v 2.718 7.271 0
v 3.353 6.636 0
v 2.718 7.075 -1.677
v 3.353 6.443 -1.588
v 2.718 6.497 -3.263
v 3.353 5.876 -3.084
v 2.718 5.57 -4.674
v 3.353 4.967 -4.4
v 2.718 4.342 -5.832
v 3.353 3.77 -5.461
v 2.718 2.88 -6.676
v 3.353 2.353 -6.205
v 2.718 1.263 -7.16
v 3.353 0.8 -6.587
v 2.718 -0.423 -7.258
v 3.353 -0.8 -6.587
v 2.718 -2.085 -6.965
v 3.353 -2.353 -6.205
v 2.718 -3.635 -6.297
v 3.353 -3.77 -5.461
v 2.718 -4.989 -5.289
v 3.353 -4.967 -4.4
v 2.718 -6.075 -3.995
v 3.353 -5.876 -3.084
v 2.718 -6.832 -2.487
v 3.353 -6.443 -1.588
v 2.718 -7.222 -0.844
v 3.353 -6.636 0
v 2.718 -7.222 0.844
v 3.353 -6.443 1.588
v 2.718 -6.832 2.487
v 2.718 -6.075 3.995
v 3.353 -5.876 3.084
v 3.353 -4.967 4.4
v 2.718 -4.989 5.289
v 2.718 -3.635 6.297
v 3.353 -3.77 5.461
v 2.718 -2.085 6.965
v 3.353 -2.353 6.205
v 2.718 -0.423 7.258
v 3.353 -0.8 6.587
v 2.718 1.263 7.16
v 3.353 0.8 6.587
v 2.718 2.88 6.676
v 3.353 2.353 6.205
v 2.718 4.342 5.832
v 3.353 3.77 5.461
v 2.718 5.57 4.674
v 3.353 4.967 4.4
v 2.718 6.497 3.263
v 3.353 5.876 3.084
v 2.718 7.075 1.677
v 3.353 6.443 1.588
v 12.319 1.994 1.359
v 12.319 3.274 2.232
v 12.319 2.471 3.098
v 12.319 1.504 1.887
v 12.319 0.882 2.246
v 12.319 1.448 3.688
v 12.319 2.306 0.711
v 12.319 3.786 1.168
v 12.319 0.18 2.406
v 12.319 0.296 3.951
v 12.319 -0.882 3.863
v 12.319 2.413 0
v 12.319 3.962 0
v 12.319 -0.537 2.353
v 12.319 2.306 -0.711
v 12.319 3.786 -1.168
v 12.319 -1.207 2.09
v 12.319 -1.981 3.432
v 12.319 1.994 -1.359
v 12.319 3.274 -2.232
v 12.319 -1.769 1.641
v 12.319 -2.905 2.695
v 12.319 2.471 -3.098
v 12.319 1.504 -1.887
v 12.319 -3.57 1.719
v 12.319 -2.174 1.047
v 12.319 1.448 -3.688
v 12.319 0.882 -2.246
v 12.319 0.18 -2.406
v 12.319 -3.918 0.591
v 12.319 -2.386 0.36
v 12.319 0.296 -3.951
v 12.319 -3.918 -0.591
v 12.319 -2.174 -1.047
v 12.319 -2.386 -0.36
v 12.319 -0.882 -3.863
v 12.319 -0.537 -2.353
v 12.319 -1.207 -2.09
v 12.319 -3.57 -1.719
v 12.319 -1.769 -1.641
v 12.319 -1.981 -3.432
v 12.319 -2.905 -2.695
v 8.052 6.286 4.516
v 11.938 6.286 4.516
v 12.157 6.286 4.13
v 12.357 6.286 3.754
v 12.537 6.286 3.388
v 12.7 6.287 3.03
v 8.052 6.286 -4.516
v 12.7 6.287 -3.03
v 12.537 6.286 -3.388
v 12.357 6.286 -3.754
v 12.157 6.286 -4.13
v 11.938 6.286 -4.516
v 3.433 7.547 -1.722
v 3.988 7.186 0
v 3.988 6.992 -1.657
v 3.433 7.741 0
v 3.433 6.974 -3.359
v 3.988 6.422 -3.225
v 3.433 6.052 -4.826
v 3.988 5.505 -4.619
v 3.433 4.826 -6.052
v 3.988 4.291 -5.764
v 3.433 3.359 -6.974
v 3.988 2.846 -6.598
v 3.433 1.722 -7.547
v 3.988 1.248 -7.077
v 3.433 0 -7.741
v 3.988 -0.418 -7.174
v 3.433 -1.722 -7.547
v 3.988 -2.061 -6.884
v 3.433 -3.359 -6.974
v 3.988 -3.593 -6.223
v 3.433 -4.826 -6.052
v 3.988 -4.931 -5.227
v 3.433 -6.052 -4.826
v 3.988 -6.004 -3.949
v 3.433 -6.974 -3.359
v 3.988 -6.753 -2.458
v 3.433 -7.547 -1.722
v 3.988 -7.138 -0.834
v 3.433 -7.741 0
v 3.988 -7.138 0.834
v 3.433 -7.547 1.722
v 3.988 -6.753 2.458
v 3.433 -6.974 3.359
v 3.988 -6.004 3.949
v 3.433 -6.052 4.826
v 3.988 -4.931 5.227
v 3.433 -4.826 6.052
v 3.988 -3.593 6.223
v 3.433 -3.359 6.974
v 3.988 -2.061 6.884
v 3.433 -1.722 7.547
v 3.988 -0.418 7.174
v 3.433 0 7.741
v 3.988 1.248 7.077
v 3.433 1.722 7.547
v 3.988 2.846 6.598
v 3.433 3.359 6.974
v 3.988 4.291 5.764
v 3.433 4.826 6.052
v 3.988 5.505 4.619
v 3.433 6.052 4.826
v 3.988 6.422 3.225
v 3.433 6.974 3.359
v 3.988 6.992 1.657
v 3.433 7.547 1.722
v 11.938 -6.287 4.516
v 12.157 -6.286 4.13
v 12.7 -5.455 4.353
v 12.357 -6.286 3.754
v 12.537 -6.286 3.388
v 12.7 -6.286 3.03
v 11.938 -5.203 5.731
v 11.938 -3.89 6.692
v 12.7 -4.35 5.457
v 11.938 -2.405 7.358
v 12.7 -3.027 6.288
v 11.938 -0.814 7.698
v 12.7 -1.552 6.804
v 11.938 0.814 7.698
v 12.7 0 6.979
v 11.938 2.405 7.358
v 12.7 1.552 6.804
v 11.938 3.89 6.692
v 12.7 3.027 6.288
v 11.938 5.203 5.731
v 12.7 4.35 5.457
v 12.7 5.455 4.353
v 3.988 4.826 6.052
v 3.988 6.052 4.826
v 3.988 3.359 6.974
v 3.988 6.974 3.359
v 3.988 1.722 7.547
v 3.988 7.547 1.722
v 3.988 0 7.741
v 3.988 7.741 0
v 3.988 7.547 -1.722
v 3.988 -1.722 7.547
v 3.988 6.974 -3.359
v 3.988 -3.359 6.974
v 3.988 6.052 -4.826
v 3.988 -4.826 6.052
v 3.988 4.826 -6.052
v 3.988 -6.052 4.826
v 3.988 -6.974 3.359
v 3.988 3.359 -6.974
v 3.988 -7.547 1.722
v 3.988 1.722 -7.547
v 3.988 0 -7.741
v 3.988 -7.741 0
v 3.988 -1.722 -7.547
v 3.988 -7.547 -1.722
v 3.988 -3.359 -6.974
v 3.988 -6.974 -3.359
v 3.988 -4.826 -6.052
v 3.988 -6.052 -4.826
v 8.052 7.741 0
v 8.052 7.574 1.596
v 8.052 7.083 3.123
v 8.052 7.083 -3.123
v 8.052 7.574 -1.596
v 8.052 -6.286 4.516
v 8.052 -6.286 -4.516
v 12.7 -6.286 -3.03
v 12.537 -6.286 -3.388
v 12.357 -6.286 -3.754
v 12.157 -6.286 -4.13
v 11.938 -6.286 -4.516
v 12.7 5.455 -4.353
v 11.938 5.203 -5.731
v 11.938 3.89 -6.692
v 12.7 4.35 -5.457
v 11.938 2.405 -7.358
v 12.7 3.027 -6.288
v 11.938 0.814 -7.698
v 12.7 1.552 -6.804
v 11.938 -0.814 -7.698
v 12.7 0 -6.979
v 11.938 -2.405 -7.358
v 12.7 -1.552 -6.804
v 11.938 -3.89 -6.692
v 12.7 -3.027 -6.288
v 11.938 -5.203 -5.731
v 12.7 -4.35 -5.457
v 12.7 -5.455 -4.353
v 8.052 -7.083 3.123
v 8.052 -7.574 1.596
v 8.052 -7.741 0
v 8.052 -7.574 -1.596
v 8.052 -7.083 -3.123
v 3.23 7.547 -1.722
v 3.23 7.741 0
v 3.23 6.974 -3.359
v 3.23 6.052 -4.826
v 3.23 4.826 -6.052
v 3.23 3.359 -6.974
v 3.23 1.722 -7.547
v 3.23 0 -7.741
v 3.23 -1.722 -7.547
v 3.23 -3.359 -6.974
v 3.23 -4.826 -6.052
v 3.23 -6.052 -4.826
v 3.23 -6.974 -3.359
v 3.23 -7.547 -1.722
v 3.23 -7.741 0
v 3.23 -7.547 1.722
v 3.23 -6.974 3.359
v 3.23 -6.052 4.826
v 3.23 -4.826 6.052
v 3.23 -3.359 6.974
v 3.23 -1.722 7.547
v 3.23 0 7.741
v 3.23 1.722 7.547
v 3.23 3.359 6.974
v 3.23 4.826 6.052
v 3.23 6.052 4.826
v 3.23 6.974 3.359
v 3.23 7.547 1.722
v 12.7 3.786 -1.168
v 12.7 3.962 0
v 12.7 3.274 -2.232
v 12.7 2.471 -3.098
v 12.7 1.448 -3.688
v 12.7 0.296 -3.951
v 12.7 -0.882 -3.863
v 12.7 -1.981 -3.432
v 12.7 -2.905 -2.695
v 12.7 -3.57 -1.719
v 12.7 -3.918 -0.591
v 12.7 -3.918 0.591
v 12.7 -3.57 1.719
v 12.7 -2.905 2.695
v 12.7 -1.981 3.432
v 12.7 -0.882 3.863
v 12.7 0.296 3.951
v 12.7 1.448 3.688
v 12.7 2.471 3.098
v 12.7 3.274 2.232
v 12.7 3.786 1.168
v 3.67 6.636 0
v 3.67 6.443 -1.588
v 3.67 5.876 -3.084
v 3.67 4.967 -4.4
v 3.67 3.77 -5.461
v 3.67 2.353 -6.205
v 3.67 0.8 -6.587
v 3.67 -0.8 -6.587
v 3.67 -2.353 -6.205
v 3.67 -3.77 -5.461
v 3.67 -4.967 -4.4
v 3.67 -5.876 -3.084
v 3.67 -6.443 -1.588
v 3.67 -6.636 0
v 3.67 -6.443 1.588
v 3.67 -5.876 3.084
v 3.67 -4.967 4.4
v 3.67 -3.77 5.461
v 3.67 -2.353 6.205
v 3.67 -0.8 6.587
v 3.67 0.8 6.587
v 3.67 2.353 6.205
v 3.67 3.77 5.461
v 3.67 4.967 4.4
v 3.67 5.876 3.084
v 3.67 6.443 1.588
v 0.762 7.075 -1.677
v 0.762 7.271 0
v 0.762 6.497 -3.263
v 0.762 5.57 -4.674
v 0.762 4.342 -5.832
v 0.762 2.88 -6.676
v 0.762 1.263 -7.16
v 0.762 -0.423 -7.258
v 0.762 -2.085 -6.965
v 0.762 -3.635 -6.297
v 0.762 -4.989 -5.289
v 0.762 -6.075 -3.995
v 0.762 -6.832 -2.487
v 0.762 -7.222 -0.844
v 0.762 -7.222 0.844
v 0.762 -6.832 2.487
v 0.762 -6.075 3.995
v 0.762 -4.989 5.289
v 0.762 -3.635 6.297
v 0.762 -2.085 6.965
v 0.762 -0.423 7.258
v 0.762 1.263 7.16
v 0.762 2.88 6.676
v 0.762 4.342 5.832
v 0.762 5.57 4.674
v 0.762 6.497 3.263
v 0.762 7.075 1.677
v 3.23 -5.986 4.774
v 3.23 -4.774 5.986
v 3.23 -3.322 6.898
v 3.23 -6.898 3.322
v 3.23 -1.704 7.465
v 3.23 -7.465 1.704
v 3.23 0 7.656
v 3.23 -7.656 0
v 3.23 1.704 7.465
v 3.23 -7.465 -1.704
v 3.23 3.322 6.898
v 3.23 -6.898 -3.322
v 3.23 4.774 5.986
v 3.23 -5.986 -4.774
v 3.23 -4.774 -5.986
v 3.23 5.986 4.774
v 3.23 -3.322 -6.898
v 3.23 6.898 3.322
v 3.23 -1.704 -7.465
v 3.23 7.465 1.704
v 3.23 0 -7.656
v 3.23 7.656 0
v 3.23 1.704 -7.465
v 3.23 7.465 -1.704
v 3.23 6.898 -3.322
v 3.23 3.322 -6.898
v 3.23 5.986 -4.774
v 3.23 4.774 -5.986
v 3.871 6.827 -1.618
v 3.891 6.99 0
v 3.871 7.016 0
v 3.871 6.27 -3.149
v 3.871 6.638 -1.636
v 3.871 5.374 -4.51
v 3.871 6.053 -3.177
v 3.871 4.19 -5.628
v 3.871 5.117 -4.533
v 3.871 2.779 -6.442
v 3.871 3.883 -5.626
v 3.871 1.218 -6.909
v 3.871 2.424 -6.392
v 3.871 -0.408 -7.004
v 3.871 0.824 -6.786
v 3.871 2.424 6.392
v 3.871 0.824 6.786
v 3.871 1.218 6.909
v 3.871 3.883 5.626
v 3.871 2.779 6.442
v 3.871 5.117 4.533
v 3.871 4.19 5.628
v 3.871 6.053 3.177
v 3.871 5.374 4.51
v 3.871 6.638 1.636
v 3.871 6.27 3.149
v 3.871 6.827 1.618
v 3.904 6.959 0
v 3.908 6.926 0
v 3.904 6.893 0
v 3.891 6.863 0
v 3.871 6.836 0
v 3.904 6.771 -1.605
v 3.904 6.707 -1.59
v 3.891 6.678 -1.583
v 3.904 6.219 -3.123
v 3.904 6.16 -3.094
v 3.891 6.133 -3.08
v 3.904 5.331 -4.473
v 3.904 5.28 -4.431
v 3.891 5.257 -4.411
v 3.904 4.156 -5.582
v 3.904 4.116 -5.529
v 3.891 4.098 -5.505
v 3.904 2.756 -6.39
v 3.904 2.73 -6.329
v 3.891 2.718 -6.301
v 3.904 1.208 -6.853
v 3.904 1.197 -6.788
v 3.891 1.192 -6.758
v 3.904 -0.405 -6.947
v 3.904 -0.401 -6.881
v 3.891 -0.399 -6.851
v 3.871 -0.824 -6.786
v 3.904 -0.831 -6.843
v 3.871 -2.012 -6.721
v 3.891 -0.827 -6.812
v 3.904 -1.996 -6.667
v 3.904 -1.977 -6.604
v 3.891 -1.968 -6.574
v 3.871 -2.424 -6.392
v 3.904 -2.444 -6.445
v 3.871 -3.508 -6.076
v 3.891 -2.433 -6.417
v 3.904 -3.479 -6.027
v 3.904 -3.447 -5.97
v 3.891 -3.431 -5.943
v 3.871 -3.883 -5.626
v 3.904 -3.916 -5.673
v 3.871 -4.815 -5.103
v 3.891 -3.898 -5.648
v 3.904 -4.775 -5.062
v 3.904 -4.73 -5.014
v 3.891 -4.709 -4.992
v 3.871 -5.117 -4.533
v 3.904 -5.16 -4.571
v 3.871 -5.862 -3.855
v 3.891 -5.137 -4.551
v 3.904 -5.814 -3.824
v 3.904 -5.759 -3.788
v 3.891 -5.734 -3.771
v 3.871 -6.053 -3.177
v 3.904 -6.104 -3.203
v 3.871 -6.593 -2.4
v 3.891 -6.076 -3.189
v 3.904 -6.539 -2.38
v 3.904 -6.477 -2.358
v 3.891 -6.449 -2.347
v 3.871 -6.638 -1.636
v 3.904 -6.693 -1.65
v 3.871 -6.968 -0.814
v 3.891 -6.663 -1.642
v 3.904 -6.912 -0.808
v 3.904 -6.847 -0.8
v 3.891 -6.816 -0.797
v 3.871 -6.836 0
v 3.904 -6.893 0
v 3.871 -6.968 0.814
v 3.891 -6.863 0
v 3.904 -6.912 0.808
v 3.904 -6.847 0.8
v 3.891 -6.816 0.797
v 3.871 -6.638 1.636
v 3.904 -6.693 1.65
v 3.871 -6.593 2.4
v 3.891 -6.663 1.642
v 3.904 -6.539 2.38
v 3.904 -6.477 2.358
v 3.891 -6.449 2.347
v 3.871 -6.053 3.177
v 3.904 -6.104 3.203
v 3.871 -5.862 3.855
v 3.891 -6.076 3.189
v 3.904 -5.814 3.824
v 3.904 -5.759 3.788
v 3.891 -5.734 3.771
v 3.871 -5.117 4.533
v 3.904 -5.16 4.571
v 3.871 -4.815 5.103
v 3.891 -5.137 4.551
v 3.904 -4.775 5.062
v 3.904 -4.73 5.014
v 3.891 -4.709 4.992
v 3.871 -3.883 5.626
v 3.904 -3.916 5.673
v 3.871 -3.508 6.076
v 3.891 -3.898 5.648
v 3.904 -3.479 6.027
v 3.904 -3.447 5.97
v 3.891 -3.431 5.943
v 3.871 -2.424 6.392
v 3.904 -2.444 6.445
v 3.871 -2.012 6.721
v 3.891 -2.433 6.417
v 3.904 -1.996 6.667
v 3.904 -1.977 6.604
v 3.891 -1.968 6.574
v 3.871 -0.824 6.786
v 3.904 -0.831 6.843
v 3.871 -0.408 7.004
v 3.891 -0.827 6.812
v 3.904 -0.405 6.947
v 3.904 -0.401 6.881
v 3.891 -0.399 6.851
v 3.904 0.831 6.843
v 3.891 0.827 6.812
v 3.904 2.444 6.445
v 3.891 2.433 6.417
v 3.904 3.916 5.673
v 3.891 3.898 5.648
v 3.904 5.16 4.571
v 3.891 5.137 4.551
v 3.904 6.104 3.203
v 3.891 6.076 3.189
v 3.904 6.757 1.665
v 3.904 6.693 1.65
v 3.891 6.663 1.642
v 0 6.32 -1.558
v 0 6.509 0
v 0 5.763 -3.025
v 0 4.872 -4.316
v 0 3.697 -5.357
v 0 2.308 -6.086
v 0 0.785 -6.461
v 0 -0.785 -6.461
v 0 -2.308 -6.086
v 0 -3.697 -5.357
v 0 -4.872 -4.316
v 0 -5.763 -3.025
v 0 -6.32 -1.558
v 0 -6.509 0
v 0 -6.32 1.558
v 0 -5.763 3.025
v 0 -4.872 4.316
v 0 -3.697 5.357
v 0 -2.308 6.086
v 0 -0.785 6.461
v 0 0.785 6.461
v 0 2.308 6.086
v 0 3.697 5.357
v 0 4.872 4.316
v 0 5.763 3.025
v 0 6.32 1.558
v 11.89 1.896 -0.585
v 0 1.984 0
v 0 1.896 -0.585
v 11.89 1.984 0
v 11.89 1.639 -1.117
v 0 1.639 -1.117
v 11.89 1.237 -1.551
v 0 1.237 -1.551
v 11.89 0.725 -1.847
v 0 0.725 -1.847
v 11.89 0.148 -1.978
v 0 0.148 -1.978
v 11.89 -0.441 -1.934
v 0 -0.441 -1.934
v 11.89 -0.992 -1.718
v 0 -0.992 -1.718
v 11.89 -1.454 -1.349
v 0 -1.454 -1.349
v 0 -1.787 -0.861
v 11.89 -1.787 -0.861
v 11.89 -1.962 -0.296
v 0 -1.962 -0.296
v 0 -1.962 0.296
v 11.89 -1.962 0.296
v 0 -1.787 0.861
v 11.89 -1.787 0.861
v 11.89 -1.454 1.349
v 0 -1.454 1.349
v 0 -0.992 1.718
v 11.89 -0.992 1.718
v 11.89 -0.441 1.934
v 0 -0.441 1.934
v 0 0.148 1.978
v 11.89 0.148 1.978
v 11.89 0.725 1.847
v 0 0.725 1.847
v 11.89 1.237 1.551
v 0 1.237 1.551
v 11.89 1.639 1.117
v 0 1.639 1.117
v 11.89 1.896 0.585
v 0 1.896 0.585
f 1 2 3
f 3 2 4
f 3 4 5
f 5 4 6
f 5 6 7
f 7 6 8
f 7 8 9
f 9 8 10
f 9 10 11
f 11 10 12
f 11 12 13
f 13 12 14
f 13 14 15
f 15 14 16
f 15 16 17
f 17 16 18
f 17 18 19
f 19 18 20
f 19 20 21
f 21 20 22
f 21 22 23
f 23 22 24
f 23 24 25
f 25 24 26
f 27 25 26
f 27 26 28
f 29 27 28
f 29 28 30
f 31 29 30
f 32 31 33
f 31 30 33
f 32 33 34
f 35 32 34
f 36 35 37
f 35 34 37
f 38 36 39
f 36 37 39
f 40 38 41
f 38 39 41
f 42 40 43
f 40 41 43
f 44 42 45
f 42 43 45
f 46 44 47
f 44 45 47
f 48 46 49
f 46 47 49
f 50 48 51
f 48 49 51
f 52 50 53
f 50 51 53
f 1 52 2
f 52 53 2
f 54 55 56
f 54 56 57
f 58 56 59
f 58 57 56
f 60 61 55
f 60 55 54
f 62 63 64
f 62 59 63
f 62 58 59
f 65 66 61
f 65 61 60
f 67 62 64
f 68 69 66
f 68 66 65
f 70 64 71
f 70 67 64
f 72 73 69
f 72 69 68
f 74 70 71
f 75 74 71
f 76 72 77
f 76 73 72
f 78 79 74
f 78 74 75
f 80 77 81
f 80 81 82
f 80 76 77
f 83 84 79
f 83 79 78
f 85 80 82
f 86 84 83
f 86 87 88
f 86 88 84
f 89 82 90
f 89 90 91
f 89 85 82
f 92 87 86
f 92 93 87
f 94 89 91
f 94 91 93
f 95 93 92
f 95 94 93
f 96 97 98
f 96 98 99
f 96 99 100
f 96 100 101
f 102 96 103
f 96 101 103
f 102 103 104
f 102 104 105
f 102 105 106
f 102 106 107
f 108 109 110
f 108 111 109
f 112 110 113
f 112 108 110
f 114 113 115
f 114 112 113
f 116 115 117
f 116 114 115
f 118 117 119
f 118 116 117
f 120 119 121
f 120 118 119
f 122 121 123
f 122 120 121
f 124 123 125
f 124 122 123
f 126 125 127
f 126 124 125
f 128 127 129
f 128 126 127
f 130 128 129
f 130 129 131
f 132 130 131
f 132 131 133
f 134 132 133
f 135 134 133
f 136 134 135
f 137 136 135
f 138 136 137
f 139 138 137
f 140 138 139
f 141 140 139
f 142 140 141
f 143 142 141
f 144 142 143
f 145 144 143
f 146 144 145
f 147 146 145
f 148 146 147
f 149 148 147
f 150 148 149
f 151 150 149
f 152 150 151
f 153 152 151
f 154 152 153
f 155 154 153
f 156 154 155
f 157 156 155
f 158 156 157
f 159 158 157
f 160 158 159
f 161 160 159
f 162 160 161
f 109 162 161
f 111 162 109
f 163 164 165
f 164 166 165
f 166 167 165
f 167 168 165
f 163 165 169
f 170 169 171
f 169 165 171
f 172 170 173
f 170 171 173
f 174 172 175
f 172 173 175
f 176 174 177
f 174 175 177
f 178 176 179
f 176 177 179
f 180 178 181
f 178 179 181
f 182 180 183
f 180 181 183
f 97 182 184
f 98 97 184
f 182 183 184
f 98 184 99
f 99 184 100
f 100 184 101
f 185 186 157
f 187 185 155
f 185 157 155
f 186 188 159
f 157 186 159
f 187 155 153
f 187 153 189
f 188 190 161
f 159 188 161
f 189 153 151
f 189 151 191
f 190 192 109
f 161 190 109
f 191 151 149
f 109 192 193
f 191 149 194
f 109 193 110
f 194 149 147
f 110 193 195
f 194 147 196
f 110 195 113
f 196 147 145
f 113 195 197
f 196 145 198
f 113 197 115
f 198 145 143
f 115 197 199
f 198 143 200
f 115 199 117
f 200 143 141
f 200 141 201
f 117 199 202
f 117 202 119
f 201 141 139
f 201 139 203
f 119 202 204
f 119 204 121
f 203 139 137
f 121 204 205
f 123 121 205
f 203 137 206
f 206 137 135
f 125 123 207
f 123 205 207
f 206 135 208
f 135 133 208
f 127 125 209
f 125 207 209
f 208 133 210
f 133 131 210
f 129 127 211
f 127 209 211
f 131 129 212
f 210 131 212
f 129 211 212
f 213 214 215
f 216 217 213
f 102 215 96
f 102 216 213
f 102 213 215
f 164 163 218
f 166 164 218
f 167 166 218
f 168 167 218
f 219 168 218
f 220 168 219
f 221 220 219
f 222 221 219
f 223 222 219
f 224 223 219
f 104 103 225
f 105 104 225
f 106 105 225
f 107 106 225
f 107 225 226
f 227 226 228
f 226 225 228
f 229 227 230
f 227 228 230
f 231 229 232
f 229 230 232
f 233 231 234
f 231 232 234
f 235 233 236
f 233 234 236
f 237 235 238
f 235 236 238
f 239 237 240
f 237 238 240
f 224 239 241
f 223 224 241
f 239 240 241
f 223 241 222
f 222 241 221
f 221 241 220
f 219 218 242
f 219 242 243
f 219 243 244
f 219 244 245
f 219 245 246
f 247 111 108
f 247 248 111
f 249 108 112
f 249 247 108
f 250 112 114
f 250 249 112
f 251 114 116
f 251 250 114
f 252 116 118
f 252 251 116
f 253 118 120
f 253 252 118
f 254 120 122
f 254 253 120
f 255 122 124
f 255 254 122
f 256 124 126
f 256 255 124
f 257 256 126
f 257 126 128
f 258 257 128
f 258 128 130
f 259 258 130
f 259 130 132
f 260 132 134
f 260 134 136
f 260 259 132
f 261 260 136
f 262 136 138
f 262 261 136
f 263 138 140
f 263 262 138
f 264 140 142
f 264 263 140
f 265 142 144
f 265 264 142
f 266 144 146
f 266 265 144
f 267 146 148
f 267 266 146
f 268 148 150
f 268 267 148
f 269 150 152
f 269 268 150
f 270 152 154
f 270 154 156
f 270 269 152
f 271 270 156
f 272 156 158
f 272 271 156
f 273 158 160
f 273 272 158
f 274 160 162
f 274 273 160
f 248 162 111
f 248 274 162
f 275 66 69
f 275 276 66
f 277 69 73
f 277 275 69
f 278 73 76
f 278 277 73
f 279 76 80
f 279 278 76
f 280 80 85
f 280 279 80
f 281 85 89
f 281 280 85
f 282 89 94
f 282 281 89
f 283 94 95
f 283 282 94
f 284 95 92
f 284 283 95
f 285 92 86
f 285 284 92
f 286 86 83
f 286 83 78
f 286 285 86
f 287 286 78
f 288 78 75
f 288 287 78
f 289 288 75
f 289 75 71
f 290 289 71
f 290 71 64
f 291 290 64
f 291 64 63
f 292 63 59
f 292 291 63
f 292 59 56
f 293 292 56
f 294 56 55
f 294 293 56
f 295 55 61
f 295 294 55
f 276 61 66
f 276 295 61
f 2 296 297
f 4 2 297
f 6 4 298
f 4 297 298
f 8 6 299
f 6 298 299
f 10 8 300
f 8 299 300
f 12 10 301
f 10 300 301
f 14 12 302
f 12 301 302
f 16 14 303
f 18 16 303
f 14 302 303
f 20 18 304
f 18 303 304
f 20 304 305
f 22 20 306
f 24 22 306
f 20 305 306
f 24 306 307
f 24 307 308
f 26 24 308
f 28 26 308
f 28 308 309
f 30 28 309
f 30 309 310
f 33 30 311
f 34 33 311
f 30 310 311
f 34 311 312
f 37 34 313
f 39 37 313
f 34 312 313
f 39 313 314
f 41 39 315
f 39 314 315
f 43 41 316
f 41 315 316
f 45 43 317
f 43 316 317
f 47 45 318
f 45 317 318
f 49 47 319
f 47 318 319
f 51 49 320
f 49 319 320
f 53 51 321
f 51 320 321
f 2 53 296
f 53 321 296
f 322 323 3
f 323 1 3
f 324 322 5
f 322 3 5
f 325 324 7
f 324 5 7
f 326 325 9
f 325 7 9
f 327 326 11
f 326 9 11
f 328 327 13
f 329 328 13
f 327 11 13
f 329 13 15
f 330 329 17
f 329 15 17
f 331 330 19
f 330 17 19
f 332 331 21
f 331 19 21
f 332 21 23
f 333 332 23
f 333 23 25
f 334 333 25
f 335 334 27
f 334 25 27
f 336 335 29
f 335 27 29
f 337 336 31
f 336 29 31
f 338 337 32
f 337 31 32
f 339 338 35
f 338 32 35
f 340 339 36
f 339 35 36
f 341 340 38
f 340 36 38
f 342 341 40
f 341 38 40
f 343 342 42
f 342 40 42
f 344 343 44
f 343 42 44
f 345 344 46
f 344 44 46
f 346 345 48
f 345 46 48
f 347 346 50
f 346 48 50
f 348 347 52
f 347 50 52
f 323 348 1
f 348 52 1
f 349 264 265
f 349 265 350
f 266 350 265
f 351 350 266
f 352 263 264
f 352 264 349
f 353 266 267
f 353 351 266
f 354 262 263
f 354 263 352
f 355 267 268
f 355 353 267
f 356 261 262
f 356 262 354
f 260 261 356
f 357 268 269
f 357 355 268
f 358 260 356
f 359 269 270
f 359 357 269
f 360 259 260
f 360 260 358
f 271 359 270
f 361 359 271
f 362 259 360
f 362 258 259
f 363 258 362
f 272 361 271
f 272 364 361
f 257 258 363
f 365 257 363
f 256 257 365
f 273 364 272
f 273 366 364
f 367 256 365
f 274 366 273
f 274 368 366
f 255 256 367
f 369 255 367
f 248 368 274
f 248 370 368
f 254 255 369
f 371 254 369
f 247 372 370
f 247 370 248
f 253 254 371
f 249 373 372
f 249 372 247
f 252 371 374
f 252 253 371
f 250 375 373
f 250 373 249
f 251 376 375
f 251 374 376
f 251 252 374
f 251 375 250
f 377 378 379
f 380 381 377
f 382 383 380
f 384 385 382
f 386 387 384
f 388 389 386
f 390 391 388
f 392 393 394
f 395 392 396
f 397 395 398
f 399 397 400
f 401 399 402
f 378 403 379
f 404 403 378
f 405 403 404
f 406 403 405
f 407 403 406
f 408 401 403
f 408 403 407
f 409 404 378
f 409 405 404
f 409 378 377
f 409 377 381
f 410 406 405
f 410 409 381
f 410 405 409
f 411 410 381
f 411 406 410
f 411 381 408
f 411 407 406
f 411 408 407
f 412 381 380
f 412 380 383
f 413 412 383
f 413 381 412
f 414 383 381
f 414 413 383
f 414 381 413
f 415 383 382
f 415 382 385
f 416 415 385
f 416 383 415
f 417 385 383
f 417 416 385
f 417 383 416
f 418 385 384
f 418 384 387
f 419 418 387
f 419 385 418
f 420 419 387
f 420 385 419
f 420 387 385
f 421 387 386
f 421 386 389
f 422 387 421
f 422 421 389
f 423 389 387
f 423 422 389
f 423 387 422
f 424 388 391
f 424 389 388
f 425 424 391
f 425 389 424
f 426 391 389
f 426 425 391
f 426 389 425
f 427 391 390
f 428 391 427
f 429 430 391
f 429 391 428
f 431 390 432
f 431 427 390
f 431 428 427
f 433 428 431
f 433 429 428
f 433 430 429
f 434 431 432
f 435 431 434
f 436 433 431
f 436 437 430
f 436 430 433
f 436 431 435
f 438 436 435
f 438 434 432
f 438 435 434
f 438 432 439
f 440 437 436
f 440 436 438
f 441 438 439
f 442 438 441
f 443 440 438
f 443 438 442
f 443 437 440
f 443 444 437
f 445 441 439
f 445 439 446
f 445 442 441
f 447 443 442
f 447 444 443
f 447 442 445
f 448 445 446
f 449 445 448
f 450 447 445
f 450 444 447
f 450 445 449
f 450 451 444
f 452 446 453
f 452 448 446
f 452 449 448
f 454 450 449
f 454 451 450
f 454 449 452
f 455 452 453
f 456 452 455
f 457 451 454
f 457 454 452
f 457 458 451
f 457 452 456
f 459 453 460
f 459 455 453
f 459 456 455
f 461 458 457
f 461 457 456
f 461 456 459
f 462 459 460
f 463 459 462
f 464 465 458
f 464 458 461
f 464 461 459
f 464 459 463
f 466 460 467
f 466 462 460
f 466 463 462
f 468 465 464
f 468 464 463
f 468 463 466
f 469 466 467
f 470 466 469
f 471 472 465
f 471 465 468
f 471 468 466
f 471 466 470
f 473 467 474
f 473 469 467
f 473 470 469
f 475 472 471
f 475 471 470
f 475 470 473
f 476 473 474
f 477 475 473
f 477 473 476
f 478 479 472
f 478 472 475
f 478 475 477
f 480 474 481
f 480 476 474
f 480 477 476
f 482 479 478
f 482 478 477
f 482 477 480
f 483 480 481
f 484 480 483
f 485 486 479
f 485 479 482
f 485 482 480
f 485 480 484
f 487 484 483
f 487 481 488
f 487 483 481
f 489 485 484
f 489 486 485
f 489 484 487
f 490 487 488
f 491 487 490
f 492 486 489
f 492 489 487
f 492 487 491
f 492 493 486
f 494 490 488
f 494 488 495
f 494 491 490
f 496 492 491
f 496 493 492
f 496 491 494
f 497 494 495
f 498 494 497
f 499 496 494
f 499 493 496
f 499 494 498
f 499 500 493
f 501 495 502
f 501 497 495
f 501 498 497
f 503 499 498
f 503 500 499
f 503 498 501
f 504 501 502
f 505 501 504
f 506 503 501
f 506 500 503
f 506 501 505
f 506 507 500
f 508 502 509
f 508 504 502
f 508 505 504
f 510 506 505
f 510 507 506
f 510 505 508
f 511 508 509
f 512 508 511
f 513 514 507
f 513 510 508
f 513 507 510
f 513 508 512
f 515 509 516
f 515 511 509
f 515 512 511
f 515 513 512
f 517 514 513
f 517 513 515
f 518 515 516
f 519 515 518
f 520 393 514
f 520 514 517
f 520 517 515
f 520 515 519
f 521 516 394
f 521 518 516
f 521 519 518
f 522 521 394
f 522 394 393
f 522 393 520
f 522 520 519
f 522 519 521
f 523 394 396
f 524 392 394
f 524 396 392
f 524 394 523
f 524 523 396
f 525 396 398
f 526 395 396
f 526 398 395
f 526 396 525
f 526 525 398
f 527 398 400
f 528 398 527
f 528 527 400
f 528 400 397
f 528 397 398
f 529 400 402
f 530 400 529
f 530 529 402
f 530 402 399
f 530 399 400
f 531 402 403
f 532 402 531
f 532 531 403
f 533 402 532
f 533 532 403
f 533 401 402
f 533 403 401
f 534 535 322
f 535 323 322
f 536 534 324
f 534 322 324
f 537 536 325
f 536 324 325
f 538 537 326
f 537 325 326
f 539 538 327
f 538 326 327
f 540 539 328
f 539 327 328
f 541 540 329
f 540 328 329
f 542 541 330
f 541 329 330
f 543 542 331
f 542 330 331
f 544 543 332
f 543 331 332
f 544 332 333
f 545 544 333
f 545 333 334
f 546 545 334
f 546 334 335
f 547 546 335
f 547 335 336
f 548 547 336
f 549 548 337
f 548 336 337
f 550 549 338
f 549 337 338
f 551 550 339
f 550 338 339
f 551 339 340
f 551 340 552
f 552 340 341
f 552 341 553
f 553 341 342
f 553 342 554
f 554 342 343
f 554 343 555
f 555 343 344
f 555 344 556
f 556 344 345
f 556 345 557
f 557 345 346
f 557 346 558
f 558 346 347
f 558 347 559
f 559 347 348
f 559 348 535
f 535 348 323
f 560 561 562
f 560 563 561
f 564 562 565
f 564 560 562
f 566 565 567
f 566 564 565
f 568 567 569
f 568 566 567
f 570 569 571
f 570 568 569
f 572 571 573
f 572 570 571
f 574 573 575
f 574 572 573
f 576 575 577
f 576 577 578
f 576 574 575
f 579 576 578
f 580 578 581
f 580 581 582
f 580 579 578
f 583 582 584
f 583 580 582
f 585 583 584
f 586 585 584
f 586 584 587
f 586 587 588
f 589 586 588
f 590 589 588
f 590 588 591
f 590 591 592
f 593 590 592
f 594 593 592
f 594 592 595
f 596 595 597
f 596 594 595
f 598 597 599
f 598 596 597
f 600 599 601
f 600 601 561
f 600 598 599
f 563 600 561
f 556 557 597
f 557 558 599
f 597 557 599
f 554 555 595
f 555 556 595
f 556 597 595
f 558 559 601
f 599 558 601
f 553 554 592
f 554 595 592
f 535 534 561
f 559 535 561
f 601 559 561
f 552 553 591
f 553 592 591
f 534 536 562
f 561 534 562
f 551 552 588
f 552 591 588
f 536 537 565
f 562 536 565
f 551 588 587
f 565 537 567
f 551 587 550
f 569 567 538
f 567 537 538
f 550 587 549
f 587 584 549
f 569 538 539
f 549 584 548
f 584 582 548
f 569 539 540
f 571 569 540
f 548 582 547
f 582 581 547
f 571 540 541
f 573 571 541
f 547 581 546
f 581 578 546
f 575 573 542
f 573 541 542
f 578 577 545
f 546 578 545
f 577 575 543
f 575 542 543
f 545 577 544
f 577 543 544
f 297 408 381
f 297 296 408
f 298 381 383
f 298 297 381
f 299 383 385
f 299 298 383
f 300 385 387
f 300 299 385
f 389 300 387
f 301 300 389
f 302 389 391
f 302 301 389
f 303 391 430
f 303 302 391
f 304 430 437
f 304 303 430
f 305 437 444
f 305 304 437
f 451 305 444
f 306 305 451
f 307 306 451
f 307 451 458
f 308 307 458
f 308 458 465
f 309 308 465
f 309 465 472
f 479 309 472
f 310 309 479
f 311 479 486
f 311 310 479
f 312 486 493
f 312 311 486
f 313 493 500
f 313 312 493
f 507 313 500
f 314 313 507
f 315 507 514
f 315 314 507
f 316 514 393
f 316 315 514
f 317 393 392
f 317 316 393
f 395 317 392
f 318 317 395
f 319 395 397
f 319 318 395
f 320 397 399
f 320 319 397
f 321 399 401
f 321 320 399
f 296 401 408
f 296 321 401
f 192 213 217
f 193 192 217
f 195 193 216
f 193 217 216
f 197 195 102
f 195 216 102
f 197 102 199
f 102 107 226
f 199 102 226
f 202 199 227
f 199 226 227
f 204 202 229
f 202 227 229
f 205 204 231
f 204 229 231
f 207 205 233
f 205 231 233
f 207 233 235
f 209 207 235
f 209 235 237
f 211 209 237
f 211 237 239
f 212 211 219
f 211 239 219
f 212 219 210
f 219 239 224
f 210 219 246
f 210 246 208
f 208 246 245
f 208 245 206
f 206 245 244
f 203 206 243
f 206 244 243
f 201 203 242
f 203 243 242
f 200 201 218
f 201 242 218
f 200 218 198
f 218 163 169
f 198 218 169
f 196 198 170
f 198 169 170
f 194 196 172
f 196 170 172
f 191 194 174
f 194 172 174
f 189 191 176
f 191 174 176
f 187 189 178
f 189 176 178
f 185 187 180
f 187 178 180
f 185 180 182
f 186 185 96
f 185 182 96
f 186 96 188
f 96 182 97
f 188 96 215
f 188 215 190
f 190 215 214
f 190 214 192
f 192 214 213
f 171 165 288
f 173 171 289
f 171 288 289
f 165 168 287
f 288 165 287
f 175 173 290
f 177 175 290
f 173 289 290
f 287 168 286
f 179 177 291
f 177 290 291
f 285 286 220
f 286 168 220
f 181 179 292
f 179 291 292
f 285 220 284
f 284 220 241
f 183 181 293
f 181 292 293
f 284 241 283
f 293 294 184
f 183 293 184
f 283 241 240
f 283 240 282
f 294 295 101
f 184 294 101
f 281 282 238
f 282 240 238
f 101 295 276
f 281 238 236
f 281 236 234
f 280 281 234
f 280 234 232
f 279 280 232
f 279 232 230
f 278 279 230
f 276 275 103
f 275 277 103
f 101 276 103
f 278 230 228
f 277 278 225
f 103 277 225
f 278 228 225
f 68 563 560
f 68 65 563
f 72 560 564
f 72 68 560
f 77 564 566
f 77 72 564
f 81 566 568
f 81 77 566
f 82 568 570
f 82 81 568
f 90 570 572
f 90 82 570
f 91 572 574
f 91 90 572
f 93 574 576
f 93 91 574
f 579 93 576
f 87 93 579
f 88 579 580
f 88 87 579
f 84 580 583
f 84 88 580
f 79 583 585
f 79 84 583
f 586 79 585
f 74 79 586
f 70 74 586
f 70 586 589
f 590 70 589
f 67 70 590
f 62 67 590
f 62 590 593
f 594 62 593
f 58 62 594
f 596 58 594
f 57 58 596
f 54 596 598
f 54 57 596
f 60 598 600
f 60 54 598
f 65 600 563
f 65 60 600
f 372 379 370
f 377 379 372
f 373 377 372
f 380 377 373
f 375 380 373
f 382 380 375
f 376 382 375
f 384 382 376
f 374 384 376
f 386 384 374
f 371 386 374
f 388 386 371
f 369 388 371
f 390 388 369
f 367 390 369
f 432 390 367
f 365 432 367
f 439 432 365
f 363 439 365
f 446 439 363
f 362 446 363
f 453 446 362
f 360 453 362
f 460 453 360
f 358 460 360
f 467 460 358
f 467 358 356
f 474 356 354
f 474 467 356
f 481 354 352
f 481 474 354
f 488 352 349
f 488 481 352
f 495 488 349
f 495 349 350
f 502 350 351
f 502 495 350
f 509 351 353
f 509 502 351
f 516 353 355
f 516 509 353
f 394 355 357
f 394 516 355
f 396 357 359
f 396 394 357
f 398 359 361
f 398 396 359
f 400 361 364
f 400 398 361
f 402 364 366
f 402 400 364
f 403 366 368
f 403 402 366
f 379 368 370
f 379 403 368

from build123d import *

# Parameters (mm, degrees)
SKETCH2_W          = 0.381
SKETCH2_H          = 3.9624
SKETCH4_W          = 61.9252
SKETCH4_H          = 30.9626
SKETCH4_W_2        = 30.9626
SKETCH4_H_2        = 12.573
CUT_EXTRUDE1_DEPTH = 4.6482


with BuildPart() as part:
    # Sketch1 → Revolve1 (revolve)
    with BuildSketch(Plane.XY):
        Polygon((0, 0), (0, 6.50875), (0.762, 7.27075), (2.7178, 7.27075), (3.3528, 6.63575), (3.9878, 6.63575), (3.9878, 7.74065), (11.938, 7.74065), (12.7, 6.97865), (12.7, 0), align=None)
    revolve(axis=Axis((12.7, 0, 0), (-1, 0, 0)))

    # Sketch2 → Cut-Revolve1 (revolve, cut)
    with BuildSketch(Plane.XY):
        with Locations((12.5095, 1.9812)):
            Rectangle(SKETCH2_W, SKETCH2_H)
    revolve(axis=Axis((12.7, 0, 0), (-1, 0, 0)), mode=Mode.SUBTRACT)

    # Sketch3 → Cut-Revolve2 (revolve, cut)
    with BuildSketch(Plane.XY):
        Polygon((0, 0), (0, 1.98374), (11.88974, 1.98374), (12.319, 2.413), (12.319, 0), align=None)
    revolve(axis=Axis((12.319, 0, 0), (-1, 0, 0)), mode=Mode.SUBTRACT)

    # Sketch4 → Cut-Extrude1 (cut)
    with BuildSketch(Plane(origin=(12.7, 0, 0), x_dir=(0, 0, -1), z_dir=(1, 0, 0))):
        Rectangle(SKETCH4_W, SKETCH4_H)
        Rectangle(SKETCH4_W_2, SKETCH4_H_2, mode=Mode.SUBTRACT)
    extrude(amount=-CUT_EXTRUDE1_DEPTH, mode=Mode.SUBTRACT)

    # Sketch5 → Revolve2 (revolve)
    with BuildSketch(Plane.XY):
        with BuildLine():
            Line((3.230093808, 7.74065), (3.230093808, 7.656481804))
            Line((3.230093808, 7.656481804), (3.870760245, 7.015815367))
            ThreePointArc((3.870760245, 7.015815367), (3.907957684, 6.926012806), (3.870760245, 6.836210245))
            Line((3.870760245, 6.836210245), (3.6703, 6.63575))
            Line((3.6703, 6.63575), (3.3528, 6.63575))
            Line((3.3528, 6.63575), (3.3528, 6.38175))
            Line((3.3528, 6.38175), (3.9878, 6.38175))
            Line((3.9878, 6.38175), (3.9878, 7.186143808))
            Line((3.9878, 7.186143808), (3.433293808, 7.74065))
            Line((3.433293808, 7.74065), (3.230093808, 7.74065))
        make_face()
    revolve(axis=Axis((3.9878, 0, 0), (-1, 0, 0)))


solid = part.part
